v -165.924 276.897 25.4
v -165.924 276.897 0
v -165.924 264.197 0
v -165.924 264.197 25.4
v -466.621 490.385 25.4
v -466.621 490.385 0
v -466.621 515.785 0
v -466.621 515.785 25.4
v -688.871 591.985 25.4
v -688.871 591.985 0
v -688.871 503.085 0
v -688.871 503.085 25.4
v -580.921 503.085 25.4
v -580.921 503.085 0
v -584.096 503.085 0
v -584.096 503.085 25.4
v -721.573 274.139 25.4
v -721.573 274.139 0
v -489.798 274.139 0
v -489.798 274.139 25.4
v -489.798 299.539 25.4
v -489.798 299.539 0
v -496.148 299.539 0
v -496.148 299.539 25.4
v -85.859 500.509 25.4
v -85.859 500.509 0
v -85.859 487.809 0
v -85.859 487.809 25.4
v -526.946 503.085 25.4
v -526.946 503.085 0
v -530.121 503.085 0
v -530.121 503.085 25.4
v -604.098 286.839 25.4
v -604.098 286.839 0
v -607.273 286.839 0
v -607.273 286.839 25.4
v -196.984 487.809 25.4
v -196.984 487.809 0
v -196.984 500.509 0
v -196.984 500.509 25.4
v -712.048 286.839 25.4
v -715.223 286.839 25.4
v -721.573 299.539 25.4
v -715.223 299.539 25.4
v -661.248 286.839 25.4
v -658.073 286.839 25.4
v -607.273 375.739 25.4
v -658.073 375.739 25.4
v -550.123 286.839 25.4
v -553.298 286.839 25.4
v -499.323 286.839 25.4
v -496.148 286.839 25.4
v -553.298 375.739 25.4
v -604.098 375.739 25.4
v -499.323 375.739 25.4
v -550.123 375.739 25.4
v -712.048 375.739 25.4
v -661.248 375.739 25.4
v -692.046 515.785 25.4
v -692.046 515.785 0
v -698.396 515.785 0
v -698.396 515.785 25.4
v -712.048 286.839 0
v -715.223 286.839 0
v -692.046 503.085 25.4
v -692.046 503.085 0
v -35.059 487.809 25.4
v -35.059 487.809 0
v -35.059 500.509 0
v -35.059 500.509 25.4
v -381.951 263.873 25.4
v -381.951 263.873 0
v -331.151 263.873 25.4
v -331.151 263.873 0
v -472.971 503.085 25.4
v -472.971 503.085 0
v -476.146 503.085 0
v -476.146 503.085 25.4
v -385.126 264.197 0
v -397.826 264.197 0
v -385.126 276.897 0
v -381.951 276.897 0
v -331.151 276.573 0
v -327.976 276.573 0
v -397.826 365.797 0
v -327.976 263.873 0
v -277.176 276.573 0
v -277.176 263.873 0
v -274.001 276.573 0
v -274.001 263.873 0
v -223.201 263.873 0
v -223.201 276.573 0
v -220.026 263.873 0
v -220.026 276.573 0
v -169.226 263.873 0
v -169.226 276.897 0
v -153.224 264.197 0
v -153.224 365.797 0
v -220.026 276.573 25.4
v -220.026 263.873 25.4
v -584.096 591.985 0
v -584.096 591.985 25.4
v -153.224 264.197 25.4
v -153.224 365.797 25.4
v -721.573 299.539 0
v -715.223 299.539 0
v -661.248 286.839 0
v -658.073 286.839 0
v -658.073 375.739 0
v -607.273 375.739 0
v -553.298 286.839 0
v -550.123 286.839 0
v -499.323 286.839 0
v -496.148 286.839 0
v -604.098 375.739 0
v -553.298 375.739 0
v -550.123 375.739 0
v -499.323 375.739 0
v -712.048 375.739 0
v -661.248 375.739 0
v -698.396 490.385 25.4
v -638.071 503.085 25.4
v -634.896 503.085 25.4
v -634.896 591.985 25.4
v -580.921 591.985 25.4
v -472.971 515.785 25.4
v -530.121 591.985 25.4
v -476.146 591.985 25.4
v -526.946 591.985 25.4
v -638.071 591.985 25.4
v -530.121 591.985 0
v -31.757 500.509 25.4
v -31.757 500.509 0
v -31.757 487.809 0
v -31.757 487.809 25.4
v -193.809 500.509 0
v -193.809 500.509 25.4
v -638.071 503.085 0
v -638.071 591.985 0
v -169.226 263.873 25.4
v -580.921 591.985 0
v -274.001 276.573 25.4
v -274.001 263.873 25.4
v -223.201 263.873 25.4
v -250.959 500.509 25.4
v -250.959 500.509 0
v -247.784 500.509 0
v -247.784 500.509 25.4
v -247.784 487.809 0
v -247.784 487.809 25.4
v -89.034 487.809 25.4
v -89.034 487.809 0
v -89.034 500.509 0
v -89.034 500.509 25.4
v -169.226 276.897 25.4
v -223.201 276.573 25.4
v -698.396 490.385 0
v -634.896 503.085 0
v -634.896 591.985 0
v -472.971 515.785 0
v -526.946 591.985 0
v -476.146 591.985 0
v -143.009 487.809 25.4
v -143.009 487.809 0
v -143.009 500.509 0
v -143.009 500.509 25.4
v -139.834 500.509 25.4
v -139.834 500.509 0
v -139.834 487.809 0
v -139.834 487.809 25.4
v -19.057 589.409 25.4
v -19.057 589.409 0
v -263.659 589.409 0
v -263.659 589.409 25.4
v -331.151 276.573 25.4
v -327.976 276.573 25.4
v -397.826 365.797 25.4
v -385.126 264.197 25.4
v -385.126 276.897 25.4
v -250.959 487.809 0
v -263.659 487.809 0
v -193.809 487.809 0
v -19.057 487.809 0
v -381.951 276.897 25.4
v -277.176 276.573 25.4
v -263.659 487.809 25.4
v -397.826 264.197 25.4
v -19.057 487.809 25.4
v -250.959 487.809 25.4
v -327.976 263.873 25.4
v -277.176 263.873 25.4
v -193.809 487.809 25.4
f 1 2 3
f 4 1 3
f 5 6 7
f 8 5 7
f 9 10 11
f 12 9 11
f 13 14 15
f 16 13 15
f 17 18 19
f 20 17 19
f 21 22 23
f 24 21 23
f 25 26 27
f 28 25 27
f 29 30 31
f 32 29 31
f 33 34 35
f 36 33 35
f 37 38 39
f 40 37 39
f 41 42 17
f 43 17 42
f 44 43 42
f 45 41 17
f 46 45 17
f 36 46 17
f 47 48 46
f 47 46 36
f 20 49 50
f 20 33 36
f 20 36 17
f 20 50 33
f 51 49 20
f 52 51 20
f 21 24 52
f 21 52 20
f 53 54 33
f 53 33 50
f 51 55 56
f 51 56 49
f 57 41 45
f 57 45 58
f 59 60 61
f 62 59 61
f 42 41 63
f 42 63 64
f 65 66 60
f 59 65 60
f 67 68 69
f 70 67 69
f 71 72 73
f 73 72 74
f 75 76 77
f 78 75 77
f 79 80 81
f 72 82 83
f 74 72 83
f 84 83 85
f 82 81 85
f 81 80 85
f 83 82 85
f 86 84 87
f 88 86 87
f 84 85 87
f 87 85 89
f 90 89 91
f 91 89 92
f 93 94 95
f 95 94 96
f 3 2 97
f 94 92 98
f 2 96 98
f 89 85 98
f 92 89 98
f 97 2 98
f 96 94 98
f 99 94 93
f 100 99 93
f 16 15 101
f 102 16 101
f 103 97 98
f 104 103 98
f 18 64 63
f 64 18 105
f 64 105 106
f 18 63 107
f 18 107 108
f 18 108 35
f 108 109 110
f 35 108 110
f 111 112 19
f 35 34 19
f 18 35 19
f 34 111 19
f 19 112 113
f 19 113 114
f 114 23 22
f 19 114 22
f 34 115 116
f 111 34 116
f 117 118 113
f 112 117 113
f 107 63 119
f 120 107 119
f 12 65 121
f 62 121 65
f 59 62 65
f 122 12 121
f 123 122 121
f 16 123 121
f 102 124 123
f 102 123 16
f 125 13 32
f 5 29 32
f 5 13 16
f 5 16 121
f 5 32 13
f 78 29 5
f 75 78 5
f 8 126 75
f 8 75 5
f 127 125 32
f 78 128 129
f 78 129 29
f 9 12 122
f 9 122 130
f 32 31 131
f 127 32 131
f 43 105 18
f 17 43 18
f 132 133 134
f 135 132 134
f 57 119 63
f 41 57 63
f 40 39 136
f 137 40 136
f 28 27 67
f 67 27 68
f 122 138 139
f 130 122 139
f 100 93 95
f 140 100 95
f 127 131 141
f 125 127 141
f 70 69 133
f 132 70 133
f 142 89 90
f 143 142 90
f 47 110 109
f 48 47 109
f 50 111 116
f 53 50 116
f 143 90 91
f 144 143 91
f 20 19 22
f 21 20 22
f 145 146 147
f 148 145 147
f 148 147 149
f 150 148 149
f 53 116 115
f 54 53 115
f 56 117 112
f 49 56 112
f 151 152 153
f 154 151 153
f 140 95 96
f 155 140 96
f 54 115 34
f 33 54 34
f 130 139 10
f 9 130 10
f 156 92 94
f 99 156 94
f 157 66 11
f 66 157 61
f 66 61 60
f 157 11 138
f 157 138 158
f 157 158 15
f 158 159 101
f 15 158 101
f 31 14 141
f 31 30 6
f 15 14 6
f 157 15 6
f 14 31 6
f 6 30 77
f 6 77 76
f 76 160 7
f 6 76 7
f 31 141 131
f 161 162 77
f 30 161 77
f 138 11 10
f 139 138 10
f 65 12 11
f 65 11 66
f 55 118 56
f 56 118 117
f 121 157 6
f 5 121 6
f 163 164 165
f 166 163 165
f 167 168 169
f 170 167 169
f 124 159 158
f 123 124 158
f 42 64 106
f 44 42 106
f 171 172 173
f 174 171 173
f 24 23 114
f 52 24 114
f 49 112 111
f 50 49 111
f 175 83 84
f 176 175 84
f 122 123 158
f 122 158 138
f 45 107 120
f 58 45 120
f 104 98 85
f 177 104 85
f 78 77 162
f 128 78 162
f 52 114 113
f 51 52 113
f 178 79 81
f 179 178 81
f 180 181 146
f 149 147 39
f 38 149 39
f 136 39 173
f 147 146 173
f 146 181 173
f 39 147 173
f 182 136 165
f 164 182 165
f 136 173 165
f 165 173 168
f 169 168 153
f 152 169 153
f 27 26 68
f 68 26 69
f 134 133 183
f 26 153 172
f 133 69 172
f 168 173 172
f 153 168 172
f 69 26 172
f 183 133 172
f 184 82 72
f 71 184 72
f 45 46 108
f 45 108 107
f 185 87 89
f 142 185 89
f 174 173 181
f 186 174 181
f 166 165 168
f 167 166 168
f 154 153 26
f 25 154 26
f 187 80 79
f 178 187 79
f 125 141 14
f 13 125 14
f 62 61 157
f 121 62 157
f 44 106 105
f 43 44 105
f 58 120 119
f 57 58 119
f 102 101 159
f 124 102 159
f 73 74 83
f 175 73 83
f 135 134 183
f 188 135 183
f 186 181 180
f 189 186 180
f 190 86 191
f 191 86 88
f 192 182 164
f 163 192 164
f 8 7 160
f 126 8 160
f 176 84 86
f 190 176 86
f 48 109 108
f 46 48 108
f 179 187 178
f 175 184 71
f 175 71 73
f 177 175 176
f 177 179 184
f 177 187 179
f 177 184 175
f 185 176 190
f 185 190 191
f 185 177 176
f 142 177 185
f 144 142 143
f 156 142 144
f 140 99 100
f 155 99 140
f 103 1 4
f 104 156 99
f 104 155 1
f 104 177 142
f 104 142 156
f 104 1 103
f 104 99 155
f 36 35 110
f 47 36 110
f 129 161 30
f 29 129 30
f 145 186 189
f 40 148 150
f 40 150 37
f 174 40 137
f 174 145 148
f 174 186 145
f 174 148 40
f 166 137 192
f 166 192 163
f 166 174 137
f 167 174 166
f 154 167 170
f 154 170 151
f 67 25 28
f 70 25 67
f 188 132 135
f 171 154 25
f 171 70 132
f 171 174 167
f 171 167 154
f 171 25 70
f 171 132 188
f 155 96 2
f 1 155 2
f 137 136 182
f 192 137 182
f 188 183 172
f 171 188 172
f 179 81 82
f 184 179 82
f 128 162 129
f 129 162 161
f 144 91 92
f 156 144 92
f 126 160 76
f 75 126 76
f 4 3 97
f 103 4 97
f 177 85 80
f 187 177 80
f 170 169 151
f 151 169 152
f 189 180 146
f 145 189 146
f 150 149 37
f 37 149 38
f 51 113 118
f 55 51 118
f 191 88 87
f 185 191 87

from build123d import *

# Parameters (mm, degrees)
F1_DEPTH = 25.4


with BuildPart() as f1:
    # F0 (on Top) → F1 (new body)
    with BuildSketch(Plane.XY):
        Polygon((-698.396364, 490.385244), (-688.871364, 490.385244), (-582.508864, 490.385244), (-582.508864, 503.085244), (-584.096364, 503.085244), (-584.096364, 591.985244), (-634.896364, 591.985244), (-634.896364, 503.085244), (-638.071364, 503.085244), (-638.071364, 591.985244), (-688.871364, 591.985244), (-688.871364, 503.085244), (-692.046364, 503.085244), (-692.046364, 515.785244), (-698.396364, 515.785244), align=None)
        Polygon((-582.508864, 503.085244), (-582.508864, 490.385244), (-476.146364, 490.385244), (-466.621364, 490.385244), (-466.621364, 515.785244), (-472.971364, 515.785244), (-472.971364, 503.085244), (-476.146364, 503.085244), (-476.146364, 591.985244), (-526.946364, 591.985244), (-526.946364, 503.085244), (-530.121364, 503.085244), (-530.121364, 591.985244), (-580.921364, 591.985244), (-580.921364, 503.085244), align=None)
        Polygon((-247.784059, 500.509252), (-247.784059, 487.809252), (-196.984059, 487.809252), (-196.984059, 500.509252), (-193.809059, 500.509252), (-193.809059, 487.809252), (-143.009059, 487.809252), (-143.009059, 500.509252), (-139.834059, 500.509252), (-139.834059, 487.809252), (-89.034059, 487.809252), (-89.034059, 500.509252), (-85.859059, 500.509252), (-85.859059, 487.809252), (-35.059059, 487.809252), (-35.059059, 500.509252), (-31.757059, 500.509252), (-31.757059, 487.809252), (-19.057059, 487.809252), (-19.057059, 589.409252), (-263.659059, 589.409252), (-263.659059, 487.809252), (-250.959059, 487.809252), (-250.959059, 500.509252), align=None)
        Polygon((-381.951268, 276.897242), (-381.951268, 263.873304), (-331.151268, 263.873304), (-331.151268, 276.573304), (-327.976268, 276.573304), (-327.976268, 263.873304), (-277.176268, 263.873304), (-277.176268, 276.573304), (-274.001268, 276.573304), (-274.001268, 263.873304), (-223.201268, 263.873304), (-223.201268, 276.573304), (-220.026268, 276.573304), (-220.026268, 263.873304), (-169.226268, 263.873304), (-169.226268, 276.897242), (-165.924268, 276.897242), (-165.924268, 264.197242), (-153.224268, 264.197242), (-153.224268, 365.797242), (-397.826268, 365.797242), (-397.826268, 264.197242), (-385.126268, 264.197242), (-385.126268, 276.897242), align=None)
        Polygon((-721.572691, 274.138915), (-712.047691, 274.138915), (-605.685191, 274.138915), (-605.685191, 286.838915), (-607.272691, 286.838915), (-607.272691, 375.738915), (-658.072691, 375.738915), (-658.072691, 286.838915), (-661.247691, 286.838915), (-661.247691, 375.738915), (-712.047691, 375.738915), (-712.047691, 286.838915), (-715.222691, 286.838915), (-715.222691, 299.538915), (-721.572691, 299.538915), align=None)
        Polygon((-605.685191, 286.838915), (-605.685191, 274.138915), (-499.322691, 274.138915), (-489.797691, 274.138915), (-489.797691, 299.538915), (-496.147691, 299.538915), (-496.147691, 286.838915), (-499.322691, 286.838915), (-499.322691, 375.738915), (-550.122691, 375.738915), (-550.122691, 286.838915), (-553.297691, 286.838915), (-553.297691, 375.738915), (-604.097691, 375.738915), (-604.097691, 286.838915), align=None)
    extrude(amount=F1_DEPTH)


solid = f1.part
